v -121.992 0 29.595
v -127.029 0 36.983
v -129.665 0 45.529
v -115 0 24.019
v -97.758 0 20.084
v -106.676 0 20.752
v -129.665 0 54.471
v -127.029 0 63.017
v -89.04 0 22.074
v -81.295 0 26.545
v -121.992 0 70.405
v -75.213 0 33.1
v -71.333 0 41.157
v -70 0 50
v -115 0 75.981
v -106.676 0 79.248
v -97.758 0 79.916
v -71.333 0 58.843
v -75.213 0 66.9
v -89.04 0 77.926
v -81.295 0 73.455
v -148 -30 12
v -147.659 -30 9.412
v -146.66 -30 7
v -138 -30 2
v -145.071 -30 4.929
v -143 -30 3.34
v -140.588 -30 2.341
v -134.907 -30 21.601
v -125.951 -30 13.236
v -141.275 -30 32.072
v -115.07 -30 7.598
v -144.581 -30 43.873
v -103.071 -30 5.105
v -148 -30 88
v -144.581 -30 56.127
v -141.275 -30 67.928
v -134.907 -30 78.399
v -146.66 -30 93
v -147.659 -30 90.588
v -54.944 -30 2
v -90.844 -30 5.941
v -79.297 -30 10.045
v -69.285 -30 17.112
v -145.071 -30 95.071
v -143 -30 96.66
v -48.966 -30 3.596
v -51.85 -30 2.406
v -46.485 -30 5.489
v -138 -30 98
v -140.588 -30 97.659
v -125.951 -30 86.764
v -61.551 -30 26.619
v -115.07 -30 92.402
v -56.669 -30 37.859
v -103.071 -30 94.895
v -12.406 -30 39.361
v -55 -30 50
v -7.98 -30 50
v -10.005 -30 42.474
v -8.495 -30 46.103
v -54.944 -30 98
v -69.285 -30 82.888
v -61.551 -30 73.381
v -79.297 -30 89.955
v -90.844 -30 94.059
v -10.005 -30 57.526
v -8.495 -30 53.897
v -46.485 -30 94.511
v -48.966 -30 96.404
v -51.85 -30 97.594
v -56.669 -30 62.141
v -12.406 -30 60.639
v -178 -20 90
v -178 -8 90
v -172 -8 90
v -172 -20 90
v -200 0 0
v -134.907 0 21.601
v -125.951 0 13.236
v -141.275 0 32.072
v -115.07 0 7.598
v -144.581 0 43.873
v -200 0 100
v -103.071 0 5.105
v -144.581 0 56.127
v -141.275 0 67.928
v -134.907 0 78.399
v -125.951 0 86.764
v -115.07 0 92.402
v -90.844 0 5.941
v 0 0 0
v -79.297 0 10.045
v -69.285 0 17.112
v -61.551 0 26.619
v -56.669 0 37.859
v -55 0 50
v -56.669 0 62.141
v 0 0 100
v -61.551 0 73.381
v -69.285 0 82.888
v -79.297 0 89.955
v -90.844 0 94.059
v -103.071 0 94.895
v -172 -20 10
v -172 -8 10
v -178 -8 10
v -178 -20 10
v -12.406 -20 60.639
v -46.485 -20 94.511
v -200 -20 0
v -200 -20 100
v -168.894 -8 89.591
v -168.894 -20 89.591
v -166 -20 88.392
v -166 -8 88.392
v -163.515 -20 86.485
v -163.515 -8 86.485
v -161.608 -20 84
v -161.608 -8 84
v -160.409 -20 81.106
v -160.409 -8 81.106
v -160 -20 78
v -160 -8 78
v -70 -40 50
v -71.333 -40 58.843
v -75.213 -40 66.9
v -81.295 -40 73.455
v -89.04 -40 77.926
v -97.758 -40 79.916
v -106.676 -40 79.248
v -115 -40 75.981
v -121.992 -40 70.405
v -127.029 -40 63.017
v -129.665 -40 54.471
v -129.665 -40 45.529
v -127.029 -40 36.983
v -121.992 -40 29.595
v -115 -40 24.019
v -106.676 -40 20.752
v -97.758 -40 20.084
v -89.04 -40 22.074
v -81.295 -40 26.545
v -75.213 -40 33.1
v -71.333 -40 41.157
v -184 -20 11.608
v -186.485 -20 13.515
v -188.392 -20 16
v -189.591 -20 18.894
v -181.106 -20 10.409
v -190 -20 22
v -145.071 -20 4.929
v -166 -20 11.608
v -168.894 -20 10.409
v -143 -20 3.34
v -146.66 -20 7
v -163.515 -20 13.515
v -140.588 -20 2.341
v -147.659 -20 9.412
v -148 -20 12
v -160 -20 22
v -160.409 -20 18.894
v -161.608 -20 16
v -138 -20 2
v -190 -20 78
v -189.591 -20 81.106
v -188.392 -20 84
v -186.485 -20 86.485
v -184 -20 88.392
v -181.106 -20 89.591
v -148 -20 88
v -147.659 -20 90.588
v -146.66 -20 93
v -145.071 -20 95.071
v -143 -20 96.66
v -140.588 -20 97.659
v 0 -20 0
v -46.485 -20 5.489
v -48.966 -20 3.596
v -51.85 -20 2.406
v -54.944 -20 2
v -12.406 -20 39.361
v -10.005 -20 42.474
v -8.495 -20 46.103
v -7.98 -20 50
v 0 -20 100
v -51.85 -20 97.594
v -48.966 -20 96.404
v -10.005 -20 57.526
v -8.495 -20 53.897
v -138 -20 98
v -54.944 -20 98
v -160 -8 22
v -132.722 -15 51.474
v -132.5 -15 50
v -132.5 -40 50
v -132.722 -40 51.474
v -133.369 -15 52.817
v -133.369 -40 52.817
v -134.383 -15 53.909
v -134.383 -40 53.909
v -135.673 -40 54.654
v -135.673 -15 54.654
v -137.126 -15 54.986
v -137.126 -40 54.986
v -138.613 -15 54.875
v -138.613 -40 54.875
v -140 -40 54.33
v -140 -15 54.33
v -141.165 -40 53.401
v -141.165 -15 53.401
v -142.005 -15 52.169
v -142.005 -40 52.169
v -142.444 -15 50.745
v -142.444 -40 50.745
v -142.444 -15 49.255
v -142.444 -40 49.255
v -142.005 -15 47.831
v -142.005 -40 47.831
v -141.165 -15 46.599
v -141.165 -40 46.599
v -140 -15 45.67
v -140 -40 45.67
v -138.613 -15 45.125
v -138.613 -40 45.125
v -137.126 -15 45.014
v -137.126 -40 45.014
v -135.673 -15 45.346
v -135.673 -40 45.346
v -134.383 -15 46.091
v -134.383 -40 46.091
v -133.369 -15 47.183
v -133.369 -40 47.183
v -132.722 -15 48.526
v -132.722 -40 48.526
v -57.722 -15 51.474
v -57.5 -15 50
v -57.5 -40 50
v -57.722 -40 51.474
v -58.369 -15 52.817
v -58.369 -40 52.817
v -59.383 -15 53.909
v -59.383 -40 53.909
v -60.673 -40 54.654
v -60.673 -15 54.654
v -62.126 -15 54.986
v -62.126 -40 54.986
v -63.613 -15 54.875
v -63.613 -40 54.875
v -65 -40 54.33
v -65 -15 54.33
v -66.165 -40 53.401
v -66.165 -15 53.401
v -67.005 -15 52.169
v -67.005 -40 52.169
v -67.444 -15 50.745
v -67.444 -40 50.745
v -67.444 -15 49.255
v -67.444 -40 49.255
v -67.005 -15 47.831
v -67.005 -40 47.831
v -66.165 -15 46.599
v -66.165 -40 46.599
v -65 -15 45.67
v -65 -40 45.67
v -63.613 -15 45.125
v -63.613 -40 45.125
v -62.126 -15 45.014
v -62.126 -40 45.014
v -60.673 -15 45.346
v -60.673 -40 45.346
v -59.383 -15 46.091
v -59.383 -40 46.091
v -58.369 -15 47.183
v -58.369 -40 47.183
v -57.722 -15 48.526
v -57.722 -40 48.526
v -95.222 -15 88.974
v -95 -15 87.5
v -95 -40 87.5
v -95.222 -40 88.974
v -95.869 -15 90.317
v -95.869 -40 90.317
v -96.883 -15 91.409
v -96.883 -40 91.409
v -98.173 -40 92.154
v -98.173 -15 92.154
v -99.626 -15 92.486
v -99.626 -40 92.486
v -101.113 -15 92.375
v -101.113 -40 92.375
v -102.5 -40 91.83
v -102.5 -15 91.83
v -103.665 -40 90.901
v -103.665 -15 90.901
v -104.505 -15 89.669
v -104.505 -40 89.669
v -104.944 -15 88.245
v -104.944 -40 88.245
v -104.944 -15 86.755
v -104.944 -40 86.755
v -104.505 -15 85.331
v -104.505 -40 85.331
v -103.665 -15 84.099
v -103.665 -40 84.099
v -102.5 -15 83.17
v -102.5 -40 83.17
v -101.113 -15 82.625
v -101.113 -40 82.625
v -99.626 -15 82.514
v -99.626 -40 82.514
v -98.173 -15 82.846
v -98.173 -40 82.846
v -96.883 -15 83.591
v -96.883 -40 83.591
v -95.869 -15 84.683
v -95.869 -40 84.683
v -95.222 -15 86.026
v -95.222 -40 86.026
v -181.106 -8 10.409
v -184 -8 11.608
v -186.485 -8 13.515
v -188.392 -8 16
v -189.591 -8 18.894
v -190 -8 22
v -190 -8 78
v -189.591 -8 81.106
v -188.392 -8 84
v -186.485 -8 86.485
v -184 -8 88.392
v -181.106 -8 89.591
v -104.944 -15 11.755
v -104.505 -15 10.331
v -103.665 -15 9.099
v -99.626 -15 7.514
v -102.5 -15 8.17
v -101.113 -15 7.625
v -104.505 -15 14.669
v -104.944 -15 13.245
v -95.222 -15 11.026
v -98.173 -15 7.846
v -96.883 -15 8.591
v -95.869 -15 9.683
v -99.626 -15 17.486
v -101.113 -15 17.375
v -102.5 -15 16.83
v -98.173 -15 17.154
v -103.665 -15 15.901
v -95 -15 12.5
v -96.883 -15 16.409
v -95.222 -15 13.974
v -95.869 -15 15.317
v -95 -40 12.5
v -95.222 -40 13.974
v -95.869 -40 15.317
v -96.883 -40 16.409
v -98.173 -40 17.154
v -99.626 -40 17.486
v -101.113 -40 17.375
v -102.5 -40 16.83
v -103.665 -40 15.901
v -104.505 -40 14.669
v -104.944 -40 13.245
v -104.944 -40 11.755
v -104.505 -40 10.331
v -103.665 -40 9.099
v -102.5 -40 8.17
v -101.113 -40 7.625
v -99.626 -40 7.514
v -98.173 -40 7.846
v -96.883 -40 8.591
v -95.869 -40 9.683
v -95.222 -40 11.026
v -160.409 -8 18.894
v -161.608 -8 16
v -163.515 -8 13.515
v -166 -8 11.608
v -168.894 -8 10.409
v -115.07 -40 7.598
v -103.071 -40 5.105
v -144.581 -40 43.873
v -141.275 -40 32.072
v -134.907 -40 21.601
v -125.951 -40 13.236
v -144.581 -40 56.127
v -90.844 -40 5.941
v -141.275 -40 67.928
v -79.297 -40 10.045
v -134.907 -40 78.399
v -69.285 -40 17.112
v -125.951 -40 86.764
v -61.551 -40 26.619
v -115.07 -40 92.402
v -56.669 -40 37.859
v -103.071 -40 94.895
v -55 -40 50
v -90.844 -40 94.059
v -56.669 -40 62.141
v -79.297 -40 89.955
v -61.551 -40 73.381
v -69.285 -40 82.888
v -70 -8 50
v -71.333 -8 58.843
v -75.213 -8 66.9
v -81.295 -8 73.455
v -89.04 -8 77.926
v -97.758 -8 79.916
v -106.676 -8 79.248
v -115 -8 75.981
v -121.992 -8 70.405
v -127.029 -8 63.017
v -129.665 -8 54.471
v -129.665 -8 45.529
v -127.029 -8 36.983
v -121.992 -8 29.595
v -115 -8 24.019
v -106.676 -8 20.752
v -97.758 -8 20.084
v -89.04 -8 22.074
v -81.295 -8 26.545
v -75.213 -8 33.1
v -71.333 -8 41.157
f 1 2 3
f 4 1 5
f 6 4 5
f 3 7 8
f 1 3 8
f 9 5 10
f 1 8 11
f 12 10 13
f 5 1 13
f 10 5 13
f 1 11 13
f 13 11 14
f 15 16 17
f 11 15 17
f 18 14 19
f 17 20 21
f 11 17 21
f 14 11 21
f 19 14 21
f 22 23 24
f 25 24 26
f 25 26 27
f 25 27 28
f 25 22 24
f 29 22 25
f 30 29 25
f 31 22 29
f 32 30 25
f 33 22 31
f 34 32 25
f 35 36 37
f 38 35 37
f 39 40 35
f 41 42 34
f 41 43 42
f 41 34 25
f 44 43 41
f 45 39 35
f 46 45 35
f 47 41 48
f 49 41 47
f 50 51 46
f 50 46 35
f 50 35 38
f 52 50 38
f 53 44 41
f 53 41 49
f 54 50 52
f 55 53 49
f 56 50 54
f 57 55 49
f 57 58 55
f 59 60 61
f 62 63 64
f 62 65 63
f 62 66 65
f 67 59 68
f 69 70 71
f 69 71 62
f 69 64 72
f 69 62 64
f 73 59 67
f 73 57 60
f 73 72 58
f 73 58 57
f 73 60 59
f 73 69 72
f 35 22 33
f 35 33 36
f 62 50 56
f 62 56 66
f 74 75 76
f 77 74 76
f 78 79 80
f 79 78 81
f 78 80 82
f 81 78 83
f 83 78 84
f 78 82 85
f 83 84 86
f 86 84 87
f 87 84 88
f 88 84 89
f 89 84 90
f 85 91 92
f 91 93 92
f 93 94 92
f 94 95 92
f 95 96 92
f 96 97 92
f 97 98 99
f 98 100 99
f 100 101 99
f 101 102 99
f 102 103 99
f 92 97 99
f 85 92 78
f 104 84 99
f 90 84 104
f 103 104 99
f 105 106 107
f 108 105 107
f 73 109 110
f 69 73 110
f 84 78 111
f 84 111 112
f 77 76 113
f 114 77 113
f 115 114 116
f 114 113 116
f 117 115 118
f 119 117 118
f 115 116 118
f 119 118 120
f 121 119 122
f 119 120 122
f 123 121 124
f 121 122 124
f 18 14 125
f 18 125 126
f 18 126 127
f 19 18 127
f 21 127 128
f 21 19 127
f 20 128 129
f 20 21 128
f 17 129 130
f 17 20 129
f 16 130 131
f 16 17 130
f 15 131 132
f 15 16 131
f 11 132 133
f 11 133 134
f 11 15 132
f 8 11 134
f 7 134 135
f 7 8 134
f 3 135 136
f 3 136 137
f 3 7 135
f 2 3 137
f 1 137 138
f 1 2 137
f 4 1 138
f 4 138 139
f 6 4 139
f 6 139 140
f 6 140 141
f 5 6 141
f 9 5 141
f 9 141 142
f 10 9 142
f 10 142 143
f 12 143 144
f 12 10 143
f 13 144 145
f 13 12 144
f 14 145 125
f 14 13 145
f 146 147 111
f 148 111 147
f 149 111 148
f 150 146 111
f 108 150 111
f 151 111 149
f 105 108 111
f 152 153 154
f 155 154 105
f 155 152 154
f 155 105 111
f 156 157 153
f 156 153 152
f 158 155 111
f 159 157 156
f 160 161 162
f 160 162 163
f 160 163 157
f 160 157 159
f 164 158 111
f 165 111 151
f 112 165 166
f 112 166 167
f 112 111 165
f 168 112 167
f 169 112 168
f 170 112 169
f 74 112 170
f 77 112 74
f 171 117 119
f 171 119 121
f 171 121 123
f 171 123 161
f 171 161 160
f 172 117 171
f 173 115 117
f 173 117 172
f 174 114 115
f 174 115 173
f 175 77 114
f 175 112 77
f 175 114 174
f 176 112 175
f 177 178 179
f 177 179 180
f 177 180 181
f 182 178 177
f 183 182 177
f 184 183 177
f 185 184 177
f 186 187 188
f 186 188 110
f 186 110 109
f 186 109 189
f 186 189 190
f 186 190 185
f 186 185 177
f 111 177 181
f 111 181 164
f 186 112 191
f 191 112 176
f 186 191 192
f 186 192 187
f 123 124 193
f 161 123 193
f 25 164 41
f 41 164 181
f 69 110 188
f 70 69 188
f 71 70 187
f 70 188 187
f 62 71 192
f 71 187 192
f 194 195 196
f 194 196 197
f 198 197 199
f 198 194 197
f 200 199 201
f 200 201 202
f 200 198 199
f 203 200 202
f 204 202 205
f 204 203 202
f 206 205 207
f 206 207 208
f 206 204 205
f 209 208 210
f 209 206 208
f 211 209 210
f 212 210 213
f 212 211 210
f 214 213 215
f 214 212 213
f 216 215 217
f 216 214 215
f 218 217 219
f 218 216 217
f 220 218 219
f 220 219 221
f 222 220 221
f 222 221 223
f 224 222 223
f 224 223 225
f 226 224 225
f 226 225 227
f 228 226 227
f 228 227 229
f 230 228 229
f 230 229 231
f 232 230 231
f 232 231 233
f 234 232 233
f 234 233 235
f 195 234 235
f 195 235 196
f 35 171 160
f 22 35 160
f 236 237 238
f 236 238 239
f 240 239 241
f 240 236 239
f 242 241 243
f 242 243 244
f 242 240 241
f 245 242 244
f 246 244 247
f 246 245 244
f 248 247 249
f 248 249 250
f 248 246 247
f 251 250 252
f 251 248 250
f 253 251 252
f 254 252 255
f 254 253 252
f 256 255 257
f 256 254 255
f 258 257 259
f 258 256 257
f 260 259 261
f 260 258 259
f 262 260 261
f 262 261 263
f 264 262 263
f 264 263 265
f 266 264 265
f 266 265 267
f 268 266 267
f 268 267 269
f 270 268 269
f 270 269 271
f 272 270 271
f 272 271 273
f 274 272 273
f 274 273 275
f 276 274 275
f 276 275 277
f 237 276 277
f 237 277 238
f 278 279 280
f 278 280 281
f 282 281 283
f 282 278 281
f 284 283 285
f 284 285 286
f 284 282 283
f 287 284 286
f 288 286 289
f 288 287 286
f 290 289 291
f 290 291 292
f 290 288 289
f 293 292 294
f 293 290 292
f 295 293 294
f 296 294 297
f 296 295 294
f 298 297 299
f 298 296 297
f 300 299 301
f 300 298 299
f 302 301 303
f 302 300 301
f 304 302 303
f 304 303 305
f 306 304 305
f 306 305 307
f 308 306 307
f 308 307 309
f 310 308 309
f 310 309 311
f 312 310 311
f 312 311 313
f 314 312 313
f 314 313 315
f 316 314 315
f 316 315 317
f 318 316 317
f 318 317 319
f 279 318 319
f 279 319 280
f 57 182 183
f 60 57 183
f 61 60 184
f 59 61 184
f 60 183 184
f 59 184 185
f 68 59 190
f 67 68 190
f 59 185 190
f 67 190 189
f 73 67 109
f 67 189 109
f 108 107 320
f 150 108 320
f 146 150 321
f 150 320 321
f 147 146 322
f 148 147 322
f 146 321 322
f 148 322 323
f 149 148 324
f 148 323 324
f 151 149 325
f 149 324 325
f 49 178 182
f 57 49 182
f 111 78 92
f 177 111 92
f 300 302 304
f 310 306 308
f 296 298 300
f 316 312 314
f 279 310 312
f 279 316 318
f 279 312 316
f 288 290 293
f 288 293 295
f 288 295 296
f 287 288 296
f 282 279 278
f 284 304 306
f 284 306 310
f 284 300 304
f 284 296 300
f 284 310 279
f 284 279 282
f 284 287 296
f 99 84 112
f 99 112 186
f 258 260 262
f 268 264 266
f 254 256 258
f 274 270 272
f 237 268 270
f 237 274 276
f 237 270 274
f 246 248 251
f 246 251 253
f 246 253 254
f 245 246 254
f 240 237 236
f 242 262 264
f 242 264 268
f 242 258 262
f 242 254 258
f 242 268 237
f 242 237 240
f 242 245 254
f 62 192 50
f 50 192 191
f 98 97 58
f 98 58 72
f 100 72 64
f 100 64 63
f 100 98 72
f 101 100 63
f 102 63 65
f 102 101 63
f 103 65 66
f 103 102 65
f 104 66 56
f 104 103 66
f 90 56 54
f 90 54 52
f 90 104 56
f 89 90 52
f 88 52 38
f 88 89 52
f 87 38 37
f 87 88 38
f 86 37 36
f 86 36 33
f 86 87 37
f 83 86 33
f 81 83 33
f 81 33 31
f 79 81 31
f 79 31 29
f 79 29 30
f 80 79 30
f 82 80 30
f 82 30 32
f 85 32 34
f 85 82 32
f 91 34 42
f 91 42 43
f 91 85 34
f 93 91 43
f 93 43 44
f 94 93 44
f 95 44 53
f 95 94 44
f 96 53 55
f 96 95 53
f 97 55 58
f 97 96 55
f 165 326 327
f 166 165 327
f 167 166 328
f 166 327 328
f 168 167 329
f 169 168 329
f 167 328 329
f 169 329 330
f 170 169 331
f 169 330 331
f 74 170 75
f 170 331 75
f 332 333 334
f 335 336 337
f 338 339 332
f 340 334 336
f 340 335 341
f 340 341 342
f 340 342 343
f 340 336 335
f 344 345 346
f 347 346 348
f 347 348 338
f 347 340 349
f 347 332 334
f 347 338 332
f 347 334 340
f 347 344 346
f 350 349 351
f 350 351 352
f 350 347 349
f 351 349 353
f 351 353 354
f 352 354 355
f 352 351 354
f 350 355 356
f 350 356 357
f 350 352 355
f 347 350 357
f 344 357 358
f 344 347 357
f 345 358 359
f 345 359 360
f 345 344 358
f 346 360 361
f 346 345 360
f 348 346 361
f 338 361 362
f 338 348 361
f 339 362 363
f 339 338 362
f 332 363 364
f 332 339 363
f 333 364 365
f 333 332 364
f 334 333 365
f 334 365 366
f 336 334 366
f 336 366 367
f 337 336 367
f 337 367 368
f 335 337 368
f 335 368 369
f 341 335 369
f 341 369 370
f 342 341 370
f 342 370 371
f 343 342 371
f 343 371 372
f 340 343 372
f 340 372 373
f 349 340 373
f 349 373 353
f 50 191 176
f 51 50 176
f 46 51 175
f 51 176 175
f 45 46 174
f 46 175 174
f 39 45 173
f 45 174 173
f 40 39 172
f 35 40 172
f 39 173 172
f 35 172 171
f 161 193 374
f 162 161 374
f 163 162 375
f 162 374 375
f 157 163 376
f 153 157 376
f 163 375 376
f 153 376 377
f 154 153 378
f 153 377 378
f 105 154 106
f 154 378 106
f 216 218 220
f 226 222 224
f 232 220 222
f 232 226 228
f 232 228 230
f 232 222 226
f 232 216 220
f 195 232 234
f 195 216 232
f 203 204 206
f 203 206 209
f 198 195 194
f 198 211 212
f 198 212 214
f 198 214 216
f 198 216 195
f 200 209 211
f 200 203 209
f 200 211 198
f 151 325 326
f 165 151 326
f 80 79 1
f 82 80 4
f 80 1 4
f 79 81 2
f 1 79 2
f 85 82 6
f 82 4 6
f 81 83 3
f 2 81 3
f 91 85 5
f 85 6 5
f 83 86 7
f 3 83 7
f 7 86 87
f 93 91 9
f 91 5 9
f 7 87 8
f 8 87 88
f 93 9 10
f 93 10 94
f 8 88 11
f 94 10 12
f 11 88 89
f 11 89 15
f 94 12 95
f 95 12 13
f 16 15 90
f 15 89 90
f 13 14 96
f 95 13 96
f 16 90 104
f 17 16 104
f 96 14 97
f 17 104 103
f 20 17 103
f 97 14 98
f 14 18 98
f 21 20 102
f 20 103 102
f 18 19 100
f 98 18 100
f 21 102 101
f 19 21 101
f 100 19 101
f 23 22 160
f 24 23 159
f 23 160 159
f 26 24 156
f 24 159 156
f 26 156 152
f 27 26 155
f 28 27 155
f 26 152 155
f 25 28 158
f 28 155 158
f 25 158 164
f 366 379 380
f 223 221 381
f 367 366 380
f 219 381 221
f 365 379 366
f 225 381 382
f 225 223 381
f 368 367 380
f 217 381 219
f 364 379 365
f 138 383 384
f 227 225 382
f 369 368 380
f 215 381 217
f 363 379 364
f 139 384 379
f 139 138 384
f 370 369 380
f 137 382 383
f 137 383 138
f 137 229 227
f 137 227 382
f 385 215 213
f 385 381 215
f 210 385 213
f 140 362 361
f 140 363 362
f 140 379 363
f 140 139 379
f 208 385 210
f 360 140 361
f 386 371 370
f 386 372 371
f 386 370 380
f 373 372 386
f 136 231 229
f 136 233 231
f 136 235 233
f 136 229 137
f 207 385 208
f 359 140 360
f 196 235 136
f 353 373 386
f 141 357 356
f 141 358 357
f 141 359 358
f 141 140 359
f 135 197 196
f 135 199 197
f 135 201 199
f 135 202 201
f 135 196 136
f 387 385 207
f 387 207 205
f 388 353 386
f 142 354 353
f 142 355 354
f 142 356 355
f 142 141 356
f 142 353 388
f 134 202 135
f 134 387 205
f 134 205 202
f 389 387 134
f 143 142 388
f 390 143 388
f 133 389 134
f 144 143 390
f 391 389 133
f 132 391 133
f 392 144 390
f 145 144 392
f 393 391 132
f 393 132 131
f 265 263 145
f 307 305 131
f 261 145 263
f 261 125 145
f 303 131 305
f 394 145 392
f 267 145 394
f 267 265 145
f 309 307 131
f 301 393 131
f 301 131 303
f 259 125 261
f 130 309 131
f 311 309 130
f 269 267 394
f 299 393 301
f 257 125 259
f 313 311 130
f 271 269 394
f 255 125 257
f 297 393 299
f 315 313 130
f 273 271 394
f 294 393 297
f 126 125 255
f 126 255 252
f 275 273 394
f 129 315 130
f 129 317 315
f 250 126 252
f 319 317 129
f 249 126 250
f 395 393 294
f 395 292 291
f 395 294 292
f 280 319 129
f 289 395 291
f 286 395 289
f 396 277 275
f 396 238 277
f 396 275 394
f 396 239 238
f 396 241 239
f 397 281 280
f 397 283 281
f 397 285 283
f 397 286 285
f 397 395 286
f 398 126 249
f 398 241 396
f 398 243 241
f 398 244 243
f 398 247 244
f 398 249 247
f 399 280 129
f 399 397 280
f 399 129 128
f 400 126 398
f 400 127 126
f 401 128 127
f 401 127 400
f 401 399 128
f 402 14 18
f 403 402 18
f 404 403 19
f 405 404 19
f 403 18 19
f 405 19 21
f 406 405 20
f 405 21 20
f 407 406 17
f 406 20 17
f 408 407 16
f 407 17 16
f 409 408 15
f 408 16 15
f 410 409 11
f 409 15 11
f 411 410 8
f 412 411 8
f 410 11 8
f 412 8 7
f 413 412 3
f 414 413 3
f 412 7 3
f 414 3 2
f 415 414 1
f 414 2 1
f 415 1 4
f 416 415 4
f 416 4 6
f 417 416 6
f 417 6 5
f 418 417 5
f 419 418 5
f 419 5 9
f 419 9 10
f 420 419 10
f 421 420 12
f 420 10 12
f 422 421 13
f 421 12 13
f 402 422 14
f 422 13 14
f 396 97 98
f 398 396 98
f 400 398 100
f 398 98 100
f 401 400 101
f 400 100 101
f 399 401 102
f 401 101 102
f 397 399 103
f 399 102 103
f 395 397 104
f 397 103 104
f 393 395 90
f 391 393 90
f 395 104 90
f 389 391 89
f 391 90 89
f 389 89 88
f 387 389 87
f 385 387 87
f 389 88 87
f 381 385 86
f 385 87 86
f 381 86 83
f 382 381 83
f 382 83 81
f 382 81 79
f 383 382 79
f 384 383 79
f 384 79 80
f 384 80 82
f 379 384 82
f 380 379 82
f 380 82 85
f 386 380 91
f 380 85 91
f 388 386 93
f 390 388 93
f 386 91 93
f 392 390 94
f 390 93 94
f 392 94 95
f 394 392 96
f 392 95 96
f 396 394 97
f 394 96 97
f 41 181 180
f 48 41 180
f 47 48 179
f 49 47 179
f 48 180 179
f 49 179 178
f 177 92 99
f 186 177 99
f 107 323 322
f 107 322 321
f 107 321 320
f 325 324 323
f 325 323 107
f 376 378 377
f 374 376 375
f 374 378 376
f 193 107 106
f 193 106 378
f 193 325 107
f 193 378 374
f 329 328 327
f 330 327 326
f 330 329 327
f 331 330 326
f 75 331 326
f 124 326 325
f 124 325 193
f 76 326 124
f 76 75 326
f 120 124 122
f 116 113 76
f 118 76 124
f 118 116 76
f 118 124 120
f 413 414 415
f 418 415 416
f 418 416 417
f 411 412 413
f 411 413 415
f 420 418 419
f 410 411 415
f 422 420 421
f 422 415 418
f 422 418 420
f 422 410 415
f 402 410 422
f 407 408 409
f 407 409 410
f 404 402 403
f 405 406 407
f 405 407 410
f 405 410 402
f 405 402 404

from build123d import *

# Parameters (mm, degrees)
F0_R     = 30
F1_DEPTH = 8
F0_W     = 200
F0_H     = 100
F2_DEPTH = 20
F0_R_2   = 45
F3_DEPTH = 30
F0_R_3   = 5
F4_DEPTH = 40
F5_DEPTH = 15


with BuildPart() as f1:
    # F0 (on Front) → F1 (new body)
    with BuildSketch(Plane.XZ):
        with Locations((-100, 50)):
            Circle(F0_R)
        with BuildLine():
            Line((-172, 90), (-178, 90))
            ThreePointArc((-178, 90), (-186.485281, 86.485281), (-190, 78))
            Line((-190, 78), (-190, 22))
            ThreePointArc((-190, 22), (-186.485281, 13.514719), (-178, 10))
            Line((-178, 10), (-172, 10))
            ThreePointArc((-172, 10), (-163.514719, 13.514719), (-160, 22))
            Line((-160, 22), (-160, 78))
            ThreePointArc((-160, 78), (-163.514719, 86.485281), (-172, 90))
        make_face()
    extrude(amount=F1_DEPTH)

    # F0 (on Front) → F2 (join)
    with BuildSketch(Plane.XZ):
        with Locations((-100, 50)):
            Rectangle(F0_W, F0_H)
        with BuildLine():
            ThreePointArc((-190, 78), (-186.485281, 86.485281), (-178, 90))
            Line((-178, 90), (-172, 90))
            ThreePointArc((-172, 90), (-163.514719, 86.485281), (-160, 78))
            Line((-160, 78), (-160, 22))
            ThreePointArc((-160, 22), (-163.514719, 13.514719), (-172, 10))
            Line((-172, 10), (-178, 10))
            ThreePointArc((-178, 10), (-186.485281, 13.514719), (-190, 22))
            Line((-190, 22), (-190, 78))
        make_face(mode=Mode.SUBTRACT)
        with BuildLine():
            Line((-148, 12), (-148, 88))
            ThreePointArc((-148, 88), (-145.071068, 95.071068), (-138, 98))
            Line((-138, 98), (-54.944423, 98))
            ThreePointArc((-54.944423, 98), (-50.369094, 97.093528), (-46.485, 94.511061))
            Line((-46.485, 94.511061), (-12.406, 60.638827))
            ThreePointArc((-12.406, 60.638827), (-7.980278, 50), (-12.406, 39.361173))
            Line((-12.406, 39.361173), (-46.485, 5.488939))
            ThreePointArc((-46.485, 5.488939), (-50.369094, 2.906472), (-54.944423, 2))
            Line((-54.944423, 2), (-138, 2))
            ThreePointArc((-138, 2), (-145.071068, 4.928932), (-148, 12))
        make_face(mode=Mode.SUBTRACT)
    extrude(amount=F2_DEPTH)

    # F0 (on Front) → F3 (join)
    with BuildSketch(Plane.XZ):
        with BuildLine():
            ThreePointArc((-138, 98), (-145.071068, 95.071068), (-148, 88))
            Line((-148, 88), (-148, 12))
            ThreePointArc((-148, 12), (-145.071068, 4.928932), (-138, 2))
            Line((-138, 2), (-54.944423, 2))
            ThreePointArc((-54.944423, 2), (-50.369094, 2.906472), (-46.485, 5.488939))
            Line((-46.485, 5.488939), (-12.406, 39.361173))
            ThreePointArc((-12.406, 39.361173), (-7.980278, 50), (-12.406, 60.638827))
            Line((-12.406, 60.638827), (-46.485, 94.511061))
            ThreePointArc((-46.485, 94.511061), (-50.369094, 97.093528), (-54.944423, 98))
            Line((-54.944423, 98), (-138, 98))
        make_face()
        with Locations((-100, 50)):
            Circle(F0_R_2, mode=Mode.SUBTRACT)
    extrude(amount=F3_DEPTH)


with BuildPart() as f4:
    # F0 (on Front) → F4 (new body)
    with BuildSketch(Plane.XZ):
        with Locations((-100, 50)):
            Circle(F0_R_2)
        with Locations((-100, 12.5)):
            Circle(F0_R_3, mode=Mode.SUBTRACT)
        with Locations((-137.5, 50)):
            Circle(F0_R_3, mode=Mode.SUBTRACT)
        with Locations((-100, 50)):
            Circle(F0_R, mode=Mode.SUBTRACT)
        with Locations((-62.5, 50)):
            Circle(F0_R_3, mode=Mode.SUBTRACT)
        with Locations((-100, 87.5)):
            Circle(F0_R_3, mode=Mode.SUBTRACT)
    extrude(amount=F4_DEPTH)

    # F0 (on Front) → F5 (join)
    with BuildSketch(Plane.XZ):
        with Locations((-100, 87.5)):
            Circle(F0_R_3)
        with Locations((-62.5, 50)):
            Circle(F0_R_3)
        with Locations((-100, 12.5)):
            Circle(F0_R_3)
        with Locations((-137.5, 50)):
            Circle(F0_R_3)
    extrude(amount=F5_DEPTH)


solid = Compound([f1.part, f4.part])
